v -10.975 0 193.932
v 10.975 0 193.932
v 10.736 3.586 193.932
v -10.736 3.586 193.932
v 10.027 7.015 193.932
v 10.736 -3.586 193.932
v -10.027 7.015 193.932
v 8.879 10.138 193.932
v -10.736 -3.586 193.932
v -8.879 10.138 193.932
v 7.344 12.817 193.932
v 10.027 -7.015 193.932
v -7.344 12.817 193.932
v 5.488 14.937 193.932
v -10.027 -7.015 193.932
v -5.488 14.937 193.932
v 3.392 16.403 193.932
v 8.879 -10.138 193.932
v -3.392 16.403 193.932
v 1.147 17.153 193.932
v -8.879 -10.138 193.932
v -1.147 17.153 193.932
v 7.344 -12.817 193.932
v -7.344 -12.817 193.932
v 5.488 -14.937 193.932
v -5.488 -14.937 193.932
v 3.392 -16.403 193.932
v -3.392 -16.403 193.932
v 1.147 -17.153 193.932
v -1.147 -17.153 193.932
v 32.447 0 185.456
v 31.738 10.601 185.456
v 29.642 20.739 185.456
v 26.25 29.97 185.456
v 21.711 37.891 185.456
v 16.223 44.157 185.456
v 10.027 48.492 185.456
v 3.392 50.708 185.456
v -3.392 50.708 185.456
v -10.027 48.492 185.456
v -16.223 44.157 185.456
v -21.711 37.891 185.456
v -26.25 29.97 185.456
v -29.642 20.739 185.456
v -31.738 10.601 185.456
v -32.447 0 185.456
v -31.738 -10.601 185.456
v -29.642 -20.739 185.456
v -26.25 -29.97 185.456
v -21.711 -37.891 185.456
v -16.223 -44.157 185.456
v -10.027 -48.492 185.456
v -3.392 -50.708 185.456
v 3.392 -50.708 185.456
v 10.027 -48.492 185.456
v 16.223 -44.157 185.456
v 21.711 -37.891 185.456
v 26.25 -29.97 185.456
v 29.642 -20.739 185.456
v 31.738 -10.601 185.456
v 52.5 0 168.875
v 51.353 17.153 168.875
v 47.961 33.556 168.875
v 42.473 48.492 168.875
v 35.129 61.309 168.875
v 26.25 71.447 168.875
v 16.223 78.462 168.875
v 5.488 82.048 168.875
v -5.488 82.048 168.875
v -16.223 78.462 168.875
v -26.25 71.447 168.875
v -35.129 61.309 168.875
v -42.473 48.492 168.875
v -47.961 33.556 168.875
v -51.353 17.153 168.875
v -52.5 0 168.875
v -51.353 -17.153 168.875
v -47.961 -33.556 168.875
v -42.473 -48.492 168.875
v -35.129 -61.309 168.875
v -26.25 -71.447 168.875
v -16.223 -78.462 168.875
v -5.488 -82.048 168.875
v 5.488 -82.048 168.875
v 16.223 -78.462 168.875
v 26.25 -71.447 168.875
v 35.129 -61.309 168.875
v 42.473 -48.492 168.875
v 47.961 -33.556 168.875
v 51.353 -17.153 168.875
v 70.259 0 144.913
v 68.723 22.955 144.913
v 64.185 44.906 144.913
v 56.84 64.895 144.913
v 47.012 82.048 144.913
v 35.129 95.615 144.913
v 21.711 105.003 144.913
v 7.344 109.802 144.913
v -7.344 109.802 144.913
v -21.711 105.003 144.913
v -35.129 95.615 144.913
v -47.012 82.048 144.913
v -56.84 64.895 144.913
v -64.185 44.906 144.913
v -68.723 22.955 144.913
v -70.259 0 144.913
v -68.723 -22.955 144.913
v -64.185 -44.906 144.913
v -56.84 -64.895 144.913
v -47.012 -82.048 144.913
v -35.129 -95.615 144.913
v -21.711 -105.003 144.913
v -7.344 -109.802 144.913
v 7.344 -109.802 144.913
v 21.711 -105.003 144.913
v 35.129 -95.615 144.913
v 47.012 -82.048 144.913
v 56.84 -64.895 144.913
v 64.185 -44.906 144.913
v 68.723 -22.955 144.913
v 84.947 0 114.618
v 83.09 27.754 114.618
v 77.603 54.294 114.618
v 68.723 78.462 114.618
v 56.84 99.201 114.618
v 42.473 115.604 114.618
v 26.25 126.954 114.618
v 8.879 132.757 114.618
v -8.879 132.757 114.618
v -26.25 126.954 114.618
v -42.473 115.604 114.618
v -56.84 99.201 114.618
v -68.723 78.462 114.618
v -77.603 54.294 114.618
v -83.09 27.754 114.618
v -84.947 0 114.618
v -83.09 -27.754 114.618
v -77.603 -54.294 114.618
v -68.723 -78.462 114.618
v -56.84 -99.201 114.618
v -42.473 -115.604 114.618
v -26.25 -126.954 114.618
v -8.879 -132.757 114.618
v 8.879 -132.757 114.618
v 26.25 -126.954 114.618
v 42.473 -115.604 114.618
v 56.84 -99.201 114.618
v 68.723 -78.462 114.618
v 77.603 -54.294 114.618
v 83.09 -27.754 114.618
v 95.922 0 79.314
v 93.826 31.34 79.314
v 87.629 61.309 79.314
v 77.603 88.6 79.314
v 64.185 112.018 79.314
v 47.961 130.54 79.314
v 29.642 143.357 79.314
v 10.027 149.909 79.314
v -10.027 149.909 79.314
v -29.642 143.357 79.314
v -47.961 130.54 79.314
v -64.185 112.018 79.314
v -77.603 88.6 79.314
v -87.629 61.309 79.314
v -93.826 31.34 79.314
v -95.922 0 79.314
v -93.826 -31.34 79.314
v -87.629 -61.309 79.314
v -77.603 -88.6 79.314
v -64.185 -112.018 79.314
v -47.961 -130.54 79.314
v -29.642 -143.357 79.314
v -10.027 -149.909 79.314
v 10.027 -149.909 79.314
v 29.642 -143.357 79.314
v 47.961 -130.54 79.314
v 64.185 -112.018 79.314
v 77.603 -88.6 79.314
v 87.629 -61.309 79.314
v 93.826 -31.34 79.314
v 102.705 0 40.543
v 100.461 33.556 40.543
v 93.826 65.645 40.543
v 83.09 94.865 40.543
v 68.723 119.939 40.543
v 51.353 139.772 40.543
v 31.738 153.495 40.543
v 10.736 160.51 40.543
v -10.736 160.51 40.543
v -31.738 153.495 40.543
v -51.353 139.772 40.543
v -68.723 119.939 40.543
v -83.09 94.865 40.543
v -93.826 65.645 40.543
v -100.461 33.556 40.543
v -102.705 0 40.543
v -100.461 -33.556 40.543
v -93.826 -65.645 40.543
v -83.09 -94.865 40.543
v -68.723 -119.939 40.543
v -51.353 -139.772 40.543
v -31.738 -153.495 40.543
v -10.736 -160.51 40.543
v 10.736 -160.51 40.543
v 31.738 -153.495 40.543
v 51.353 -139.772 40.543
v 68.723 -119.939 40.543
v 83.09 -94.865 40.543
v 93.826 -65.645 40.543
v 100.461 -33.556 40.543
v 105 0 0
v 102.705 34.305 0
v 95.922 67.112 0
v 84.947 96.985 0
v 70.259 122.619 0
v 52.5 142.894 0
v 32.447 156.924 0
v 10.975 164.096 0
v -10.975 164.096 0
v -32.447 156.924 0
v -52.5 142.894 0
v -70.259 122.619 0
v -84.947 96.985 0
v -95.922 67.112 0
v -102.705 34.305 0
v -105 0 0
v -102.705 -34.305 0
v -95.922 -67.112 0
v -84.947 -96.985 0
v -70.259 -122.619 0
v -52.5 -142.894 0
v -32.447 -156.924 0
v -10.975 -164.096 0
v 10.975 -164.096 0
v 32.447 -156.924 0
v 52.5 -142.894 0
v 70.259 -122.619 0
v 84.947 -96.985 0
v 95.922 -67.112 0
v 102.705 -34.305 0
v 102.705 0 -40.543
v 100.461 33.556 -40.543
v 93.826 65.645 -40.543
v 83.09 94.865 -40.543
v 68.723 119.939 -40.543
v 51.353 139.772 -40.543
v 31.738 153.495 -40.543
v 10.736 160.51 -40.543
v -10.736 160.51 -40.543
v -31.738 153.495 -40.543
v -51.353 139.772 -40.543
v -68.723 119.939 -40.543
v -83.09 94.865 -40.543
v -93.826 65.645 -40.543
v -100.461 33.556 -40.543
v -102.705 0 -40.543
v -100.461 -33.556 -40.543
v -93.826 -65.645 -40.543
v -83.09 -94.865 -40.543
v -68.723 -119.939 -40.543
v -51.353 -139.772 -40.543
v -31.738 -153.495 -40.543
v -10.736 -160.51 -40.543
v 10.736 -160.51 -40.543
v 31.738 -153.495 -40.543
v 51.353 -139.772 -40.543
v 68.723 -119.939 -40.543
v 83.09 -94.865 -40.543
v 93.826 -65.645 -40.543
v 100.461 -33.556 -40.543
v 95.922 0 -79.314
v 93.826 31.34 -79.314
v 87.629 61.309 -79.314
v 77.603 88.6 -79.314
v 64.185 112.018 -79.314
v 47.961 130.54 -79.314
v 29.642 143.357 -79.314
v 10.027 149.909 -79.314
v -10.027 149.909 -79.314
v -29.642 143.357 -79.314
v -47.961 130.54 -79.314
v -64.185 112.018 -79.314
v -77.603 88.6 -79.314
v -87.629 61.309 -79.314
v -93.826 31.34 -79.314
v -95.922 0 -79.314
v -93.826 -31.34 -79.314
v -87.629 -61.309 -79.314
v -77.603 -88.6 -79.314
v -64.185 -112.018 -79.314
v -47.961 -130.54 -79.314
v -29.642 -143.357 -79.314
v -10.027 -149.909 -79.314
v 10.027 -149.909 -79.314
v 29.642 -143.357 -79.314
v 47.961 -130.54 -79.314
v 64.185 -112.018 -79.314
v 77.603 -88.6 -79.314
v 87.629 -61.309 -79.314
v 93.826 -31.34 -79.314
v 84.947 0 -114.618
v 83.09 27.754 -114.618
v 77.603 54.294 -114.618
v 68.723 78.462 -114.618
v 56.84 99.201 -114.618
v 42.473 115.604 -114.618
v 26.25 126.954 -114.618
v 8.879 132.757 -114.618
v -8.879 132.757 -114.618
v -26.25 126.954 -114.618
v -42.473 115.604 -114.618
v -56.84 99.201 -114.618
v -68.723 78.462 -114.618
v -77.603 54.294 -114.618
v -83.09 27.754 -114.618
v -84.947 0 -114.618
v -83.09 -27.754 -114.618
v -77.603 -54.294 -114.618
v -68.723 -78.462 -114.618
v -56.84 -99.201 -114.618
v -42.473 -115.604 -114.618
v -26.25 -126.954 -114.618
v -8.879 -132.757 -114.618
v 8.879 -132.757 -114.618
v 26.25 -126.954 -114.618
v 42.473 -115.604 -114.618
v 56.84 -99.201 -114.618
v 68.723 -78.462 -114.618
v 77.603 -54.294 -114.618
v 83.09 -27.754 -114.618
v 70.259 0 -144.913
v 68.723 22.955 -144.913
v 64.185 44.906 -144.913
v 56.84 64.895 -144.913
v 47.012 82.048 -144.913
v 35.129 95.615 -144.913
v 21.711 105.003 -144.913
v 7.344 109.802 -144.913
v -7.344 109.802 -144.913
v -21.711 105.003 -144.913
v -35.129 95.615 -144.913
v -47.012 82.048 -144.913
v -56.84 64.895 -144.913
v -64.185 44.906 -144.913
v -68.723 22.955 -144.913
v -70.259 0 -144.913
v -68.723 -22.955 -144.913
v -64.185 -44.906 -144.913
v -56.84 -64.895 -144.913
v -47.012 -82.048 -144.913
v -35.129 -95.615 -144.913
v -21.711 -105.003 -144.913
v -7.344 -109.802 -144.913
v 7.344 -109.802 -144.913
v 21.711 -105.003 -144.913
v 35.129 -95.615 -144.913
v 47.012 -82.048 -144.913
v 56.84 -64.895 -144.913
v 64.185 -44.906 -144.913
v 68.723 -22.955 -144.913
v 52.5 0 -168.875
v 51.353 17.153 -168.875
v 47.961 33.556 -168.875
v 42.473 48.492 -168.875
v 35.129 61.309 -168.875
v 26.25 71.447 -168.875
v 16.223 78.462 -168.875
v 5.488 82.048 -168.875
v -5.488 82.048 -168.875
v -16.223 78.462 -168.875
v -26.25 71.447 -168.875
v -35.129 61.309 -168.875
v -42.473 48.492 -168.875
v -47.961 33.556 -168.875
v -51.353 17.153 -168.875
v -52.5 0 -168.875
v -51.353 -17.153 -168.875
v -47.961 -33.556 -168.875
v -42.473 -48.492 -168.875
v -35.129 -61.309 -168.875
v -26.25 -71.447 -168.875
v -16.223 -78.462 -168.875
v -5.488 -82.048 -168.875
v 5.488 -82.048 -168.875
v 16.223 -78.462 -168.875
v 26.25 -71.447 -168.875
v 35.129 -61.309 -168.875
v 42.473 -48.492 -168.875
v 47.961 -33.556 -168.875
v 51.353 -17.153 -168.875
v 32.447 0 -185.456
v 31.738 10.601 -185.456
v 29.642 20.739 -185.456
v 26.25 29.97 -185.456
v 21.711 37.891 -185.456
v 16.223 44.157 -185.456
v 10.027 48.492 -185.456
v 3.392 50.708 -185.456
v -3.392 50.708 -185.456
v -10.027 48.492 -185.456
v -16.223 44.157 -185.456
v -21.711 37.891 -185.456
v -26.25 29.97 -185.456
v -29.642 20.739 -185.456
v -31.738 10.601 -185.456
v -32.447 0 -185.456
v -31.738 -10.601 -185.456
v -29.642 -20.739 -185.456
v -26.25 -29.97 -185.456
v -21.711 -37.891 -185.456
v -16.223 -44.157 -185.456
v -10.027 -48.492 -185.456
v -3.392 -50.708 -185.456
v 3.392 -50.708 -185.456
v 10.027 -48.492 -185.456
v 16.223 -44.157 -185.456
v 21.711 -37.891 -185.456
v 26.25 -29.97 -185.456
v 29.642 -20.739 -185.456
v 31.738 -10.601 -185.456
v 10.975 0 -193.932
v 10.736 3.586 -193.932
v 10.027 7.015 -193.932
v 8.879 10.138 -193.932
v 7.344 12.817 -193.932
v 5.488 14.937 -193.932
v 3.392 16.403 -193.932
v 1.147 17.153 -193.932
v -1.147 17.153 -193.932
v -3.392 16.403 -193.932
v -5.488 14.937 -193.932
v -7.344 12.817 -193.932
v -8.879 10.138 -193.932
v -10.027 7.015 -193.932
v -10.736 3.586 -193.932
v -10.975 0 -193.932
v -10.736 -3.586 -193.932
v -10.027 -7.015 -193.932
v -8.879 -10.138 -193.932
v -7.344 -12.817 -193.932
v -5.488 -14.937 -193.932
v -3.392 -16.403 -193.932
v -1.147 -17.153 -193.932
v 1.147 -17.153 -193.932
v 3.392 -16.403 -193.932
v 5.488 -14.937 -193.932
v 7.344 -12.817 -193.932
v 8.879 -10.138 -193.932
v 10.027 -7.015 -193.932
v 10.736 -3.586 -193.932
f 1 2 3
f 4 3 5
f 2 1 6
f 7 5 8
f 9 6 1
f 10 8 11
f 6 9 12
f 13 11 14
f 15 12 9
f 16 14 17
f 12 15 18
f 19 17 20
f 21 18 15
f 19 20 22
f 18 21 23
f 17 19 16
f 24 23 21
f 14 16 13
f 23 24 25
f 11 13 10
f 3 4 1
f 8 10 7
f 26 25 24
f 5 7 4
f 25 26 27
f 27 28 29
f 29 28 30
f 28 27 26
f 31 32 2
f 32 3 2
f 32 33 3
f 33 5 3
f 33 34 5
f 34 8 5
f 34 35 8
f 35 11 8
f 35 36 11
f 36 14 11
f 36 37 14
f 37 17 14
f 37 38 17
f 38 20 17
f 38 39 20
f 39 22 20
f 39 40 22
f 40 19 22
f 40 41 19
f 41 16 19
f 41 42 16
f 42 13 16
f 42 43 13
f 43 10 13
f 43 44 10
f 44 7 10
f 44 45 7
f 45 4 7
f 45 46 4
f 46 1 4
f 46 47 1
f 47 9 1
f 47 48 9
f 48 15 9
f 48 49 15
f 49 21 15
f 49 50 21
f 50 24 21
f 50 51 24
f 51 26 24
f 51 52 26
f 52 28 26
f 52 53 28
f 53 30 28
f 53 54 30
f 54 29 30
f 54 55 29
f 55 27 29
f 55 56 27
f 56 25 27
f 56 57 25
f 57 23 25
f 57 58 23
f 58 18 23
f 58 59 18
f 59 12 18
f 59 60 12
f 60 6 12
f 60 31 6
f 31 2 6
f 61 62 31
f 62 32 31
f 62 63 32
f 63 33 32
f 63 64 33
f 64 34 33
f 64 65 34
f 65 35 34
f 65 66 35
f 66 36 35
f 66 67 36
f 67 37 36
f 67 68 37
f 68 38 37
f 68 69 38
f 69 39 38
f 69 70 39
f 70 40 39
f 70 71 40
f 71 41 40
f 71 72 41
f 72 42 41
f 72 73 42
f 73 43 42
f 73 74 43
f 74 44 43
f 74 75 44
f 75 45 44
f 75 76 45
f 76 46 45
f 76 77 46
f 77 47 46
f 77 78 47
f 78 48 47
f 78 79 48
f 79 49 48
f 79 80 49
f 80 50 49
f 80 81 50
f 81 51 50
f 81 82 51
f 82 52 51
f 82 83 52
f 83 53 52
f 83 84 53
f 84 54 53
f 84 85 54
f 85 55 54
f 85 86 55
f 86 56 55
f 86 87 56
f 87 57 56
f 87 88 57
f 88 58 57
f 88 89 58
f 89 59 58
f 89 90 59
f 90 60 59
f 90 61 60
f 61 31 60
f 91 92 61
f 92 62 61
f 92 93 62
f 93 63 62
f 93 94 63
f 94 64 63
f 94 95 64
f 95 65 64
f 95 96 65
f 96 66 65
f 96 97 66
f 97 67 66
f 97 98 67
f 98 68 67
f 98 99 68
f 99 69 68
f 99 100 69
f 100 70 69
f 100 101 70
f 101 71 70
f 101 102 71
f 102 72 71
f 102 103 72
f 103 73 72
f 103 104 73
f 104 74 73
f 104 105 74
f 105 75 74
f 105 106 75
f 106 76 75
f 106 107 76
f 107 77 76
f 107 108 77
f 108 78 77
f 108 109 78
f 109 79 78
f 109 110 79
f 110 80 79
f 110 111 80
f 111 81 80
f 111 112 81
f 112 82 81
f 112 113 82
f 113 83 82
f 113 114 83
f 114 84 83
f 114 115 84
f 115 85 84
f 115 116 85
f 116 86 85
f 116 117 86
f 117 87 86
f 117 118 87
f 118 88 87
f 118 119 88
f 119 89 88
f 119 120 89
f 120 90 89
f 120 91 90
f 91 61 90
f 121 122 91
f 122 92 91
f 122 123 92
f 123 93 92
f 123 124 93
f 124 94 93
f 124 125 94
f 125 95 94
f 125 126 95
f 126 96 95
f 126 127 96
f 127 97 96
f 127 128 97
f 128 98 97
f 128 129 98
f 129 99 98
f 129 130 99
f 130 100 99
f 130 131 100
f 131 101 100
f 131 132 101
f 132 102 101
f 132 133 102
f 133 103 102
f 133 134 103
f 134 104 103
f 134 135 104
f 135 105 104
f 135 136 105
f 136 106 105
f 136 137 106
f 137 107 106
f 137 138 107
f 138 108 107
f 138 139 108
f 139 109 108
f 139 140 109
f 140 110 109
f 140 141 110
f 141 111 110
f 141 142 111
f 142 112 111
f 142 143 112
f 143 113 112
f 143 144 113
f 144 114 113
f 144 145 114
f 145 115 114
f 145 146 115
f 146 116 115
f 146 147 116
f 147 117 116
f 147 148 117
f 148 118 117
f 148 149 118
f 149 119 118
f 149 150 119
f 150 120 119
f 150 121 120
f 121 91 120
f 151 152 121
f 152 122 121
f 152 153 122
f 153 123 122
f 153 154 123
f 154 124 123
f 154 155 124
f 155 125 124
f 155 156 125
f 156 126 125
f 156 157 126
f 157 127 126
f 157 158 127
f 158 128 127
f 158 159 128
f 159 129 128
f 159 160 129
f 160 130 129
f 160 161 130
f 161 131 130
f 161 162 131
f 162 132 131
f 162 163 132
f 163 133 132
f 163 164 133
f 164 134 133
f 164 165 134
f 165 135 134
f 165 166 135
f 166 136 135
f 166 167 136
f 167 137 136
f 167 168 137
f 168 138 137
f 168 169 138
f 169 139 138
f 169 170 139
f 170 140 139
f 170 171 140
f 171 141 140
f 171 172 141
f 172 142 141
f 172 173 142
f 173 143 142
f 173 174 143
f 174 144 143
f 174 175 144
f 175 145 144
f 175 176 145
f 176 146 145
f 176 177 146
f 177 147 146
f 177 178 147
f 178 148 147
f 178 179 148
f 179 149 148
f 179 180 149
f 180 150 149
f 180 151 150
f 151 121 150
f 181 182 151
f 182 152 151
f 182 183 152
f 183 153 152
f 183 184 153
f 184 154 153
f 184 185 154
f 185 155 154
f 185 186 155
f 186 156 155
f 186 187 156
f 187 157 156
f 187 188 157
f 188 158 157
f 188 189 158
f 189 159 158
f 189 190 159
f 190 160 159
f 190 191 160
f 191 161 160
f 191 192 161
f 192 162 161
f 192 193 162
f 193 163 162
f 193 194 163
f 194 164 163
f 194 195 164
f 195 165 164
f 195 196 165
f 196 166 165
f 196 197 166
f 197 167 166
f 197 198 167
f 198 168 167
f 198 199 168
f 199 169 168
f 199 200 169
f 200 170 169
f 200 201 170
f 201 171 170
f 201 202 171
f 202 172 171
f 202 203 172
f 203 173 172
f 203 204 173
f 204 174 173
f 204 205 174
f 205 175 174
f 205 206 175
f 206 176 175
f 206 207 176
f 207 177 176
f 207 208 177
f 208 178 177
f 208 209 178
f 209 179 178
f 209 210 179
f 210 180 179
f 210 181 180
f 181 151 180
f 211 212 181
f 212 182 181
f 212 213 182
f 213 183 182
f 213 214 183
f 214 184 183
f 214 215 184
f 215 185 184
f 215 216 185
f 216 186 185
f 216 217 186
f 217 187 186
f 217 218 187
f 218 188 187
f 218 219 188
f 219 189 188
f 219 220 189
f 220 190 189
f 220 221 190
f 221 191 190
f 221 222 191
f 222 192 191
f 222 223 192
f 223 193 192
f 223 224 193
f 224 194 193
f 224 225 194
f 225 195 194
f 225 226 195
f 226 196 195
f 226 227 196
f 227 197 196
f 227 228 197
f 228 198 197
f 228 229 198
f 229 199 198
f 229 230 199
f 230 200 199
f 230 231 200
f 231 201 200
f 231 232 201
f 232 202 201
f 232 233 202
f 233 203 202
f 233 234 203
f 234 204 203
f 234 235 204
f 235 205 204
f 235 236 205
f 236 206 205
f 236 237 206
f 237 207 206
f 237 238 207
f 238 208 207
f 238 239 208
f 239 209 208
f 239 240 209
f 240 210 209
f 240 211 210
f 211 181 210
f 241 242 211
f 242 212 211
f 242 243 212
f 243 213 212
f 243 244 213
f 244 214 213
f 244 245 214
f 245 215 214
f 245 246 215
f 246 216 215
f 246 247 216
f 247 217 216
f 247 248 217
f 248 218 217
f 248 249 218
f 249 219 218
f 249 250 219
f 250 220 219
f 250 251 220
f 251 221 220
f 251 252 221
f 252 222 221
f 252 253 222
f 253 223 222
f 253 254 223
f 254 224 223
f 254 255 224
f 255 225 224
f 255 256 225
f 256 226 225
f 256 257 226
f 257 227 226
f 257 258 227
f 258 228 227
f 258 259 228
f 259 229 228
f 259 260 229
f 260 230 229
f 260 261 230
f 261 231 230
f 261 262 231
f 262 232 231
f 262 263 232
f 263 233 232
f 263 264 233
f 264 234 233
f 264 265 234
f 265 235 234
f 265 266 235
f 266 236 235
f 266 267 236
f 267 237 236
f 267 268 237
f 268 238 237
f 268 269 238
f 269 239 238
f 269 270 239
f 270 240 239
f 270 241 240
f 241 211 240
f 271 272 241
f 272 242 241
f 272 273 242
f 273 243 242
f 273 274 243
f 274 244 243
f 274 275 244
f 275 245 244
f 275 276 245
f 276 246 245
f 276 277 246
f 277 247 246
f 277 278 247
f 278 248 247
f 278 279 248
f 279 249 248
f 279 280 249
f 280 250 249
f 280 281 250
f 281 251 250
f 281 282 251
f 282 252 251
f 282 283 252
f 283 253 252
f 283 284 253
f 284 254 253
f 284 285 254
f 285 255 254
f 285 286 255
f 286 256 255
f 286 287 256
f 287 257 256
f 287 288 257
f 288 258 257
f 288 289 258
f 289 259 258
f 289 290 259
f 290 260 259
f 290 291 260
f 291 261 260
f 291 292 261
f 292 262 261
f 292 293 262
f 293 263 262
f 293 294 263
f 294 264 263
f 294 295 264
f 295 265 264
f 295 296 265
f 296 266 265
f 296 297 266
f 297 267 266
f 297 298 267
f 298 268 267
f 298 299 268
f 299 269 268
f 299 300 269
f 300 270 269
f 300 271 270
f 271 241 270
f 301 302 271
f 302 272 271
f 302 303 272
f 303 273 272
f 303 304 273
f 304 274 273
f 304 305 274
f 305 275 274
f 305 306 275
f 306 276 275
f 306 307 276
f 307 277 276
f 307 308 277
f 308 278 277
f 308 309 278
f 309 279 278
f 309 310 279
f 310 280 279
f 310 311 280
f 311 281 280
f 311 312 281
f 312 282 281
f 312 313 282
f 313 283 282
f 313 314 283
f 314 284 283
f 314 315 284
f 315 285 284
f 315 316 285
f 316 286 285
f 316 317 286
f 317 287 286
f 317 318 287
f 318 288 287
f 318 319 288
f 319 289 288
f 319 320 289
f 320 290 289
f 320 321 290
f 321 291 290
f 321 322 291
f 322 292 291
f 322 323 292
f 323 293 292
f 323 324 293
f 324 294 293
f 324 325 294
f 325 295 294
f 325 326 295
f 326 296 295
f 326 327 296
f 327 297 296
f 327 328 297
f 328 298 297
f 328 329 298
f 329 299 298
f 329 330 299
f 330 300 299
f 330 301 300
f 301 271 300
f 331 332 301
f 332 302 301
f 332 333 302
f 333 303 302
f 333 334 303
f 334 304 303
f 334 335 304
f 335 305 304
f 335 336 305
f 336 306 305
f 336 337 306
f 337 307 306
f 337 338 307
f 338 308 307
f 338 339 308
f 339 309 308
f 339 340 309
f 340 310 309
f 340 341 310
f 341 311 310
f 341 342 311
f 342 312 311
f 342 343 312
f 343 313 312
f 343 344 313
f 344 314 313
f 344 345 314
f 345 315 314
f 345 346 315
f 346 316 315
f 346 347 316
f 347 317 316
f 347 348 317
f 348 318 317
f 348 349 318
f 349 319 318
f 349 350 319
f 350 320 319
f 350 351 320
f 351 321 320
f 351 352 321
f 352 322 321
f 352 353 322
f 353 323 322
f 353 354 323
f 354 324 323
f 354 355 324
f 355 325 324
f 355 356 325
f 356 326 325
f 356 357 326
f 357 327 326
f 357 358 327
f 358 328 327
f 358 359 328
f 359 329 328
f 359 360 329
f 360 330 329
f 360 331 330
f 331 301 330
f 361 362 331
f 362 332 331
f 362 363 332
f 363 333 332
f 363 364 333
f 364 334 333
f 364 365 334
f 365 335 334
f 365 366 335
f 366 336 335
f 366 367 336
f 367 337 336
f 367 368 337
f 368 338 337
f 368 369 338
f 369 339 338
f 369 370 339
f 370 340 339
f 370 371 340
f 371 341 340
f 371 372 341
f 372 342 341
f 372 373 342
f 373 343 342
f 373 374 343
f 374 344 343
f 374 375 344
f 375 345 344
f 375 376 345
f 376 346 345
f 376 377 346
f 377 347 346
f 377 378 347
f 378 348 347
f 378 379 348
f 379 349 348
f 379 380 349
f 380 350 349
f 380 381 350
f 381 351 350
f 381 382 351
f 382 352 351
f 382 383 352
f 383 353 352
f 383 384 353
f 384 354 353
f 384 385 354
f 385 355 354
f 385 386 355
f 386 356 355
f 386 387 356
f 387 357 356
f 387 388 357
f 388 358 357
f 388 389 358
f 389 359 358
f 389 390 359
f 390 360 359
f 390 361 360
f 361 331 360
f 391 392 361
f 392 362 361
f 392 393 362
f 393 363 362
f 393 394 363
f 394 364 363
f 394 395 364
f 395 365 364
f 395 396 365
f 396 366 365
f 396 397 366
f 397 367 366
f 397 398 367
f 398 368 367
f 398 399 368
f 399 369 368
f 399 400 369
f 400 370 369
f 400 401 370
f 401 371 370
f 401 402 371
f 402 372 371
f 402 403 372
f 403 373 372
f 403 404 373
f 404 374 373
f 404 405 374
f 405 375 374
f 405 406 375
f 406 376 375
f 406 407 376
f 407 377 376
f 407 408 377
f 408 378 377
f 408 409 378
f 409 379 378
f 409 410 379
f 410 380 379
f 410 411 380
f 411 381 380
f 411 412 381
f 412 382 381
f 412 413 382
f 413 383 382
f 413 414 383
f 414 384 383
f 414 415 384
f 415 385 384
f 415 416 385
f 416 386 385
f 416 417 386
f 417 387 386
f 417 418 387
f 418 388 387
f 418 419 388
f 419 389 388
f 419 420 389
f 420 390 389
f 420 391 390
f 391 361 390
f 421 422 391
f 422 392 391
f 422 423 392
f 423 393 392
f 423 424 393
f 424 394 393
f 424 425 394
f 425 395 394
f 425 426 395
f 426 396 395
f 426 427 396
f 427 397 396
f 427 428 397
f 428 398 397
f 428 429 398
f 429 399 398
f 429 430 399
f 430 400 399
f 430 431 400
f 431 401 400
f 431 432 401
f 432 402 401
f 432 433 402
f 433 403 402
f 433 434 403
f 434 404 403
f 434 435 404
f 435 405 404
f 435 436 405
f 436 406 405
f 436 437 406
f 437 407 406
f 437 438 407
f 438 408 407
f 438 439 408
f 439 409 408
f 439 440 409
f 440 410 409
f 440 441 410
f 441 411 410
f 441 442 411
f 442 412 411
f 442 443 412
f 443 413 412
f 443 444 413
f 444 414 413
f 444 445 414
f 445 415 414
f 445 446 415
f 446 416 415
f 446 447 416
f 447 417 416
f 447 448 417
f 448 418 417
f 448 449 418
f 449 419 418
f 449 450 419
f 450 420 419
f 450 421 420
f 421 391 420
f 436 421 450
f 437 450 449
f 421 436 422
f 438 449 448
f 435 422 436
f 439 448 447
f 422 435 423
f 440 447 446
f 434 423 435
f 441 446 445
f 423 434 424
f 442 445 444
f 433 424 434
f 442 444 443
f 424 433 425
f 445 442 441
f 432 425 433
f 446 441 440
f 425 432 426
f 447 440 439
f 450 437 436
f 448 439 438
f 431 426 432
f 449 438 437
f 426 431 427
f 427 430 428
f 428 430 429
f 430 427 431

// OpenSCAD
// Generated by SolidPython 1.0.1 on 2020-07-29 00:39:26


scale(v = [7, 11, 13]) {
	sphere(r = 15);
}
/***********************************************
*********      SolidPython code:      **********
************************************************
 
# import packages: SolidPython
from solid import *
from solid.utils import *
from itertools import chain, combinations


class Resize:

    def __init__(self, scad_file):
        self.scad_file = scad_file
        #self.scad_file = import_scad(scad_file)
        # cone/cylinder param:
        self.r1 = 0
        self.r2 = 0
        self.h = 0
        # rectangular prism param:
        self.w = 0
        self.l = 0
        # ellipse param:
        self.r = 0

    # import OpenScad code (file name corresponds to shape)


    # classify shape + parameters
    def assign(self, param1, param2, param3):
        if self.scad_file == 'cone.scad':
            self.r1 = param1
            self.r2 = param2
            self.h = param3
        elif self.scad_file == 'cylinder.scad':
            self.r1 = param1
            self.r2 = param2
            self.h = param3
        elif self.scad_file == 'rectangularPrism.scad':
            self.h = param1
            self.l = param2
            self.w = param3
        else:
            self.r = param1
            self.h = param2

    # resize parameters
    def iterate(self):
        x = range(3, 20, 2)
        i = 1
        if self.scad_file == 'cone.scad':
            tempList = list(combinations(x, 2))
            for temp in tempList:
                param1 = temp[0]
                param2 = temp[1]
                filepath = 'produced_scad_files/' + 'cone' + str(param1) + '_' + str(param2) + '_' + '.scad'
                scad_render_to_file(cylinder(h=param1, r1=param2, r2=0), filepath)

        elif self.scad_file == 'cylinder.scad':
            tempList = list(combinations(x, 3))
            for temp in tempList:
                param1 = temp[0]
                param2 = temp[1]
                filepath = 'produced_scad_files/' + 'cylinder' + str(param1) + '_' + str(param2) + '_' + '.scad'
                scad_render_to_file(cylinder(h=param1, r1=param2, r2=param2), filepath)

        elif self.scad_file == 'rectangularPrism.scad':
            tempList = list(combinations(x, 3))
            for temp in tempList:
                param1 = temp[0]
                param2 = temp[1]
                param3 = temp[2]
                filepath = 'produced_scad_files/' + 'rectangularPrism' + str(param1) + '_' + str(param2) + '_' + str(
                    param3) + '.scad'
                scad_render_to_file(cube(size=(param1, param2, param3)), filepath)

        elif self.scad_file == 'ellipse.scad':
            tempList = list(combinations(x, 4))
            for temp in tempList:
                param1 = temp[0]
                param2 = temp[1]
                param3 = temp[2]
                param4 = temp[3]
                filepath = 'produced_scad_files/' + 'ellipse' + str(param1) + '_' + str(param2) + '_' + str(param3) + '_' + str(param4) + '.scad'
                scad_render_to_file(scale([param1, param2, param3])(sphere(r=param4)), filepath)

    def render_to_scadfile(self):
        scad_render_to_file(scad, 'example.scad') 
 
************************************************/
